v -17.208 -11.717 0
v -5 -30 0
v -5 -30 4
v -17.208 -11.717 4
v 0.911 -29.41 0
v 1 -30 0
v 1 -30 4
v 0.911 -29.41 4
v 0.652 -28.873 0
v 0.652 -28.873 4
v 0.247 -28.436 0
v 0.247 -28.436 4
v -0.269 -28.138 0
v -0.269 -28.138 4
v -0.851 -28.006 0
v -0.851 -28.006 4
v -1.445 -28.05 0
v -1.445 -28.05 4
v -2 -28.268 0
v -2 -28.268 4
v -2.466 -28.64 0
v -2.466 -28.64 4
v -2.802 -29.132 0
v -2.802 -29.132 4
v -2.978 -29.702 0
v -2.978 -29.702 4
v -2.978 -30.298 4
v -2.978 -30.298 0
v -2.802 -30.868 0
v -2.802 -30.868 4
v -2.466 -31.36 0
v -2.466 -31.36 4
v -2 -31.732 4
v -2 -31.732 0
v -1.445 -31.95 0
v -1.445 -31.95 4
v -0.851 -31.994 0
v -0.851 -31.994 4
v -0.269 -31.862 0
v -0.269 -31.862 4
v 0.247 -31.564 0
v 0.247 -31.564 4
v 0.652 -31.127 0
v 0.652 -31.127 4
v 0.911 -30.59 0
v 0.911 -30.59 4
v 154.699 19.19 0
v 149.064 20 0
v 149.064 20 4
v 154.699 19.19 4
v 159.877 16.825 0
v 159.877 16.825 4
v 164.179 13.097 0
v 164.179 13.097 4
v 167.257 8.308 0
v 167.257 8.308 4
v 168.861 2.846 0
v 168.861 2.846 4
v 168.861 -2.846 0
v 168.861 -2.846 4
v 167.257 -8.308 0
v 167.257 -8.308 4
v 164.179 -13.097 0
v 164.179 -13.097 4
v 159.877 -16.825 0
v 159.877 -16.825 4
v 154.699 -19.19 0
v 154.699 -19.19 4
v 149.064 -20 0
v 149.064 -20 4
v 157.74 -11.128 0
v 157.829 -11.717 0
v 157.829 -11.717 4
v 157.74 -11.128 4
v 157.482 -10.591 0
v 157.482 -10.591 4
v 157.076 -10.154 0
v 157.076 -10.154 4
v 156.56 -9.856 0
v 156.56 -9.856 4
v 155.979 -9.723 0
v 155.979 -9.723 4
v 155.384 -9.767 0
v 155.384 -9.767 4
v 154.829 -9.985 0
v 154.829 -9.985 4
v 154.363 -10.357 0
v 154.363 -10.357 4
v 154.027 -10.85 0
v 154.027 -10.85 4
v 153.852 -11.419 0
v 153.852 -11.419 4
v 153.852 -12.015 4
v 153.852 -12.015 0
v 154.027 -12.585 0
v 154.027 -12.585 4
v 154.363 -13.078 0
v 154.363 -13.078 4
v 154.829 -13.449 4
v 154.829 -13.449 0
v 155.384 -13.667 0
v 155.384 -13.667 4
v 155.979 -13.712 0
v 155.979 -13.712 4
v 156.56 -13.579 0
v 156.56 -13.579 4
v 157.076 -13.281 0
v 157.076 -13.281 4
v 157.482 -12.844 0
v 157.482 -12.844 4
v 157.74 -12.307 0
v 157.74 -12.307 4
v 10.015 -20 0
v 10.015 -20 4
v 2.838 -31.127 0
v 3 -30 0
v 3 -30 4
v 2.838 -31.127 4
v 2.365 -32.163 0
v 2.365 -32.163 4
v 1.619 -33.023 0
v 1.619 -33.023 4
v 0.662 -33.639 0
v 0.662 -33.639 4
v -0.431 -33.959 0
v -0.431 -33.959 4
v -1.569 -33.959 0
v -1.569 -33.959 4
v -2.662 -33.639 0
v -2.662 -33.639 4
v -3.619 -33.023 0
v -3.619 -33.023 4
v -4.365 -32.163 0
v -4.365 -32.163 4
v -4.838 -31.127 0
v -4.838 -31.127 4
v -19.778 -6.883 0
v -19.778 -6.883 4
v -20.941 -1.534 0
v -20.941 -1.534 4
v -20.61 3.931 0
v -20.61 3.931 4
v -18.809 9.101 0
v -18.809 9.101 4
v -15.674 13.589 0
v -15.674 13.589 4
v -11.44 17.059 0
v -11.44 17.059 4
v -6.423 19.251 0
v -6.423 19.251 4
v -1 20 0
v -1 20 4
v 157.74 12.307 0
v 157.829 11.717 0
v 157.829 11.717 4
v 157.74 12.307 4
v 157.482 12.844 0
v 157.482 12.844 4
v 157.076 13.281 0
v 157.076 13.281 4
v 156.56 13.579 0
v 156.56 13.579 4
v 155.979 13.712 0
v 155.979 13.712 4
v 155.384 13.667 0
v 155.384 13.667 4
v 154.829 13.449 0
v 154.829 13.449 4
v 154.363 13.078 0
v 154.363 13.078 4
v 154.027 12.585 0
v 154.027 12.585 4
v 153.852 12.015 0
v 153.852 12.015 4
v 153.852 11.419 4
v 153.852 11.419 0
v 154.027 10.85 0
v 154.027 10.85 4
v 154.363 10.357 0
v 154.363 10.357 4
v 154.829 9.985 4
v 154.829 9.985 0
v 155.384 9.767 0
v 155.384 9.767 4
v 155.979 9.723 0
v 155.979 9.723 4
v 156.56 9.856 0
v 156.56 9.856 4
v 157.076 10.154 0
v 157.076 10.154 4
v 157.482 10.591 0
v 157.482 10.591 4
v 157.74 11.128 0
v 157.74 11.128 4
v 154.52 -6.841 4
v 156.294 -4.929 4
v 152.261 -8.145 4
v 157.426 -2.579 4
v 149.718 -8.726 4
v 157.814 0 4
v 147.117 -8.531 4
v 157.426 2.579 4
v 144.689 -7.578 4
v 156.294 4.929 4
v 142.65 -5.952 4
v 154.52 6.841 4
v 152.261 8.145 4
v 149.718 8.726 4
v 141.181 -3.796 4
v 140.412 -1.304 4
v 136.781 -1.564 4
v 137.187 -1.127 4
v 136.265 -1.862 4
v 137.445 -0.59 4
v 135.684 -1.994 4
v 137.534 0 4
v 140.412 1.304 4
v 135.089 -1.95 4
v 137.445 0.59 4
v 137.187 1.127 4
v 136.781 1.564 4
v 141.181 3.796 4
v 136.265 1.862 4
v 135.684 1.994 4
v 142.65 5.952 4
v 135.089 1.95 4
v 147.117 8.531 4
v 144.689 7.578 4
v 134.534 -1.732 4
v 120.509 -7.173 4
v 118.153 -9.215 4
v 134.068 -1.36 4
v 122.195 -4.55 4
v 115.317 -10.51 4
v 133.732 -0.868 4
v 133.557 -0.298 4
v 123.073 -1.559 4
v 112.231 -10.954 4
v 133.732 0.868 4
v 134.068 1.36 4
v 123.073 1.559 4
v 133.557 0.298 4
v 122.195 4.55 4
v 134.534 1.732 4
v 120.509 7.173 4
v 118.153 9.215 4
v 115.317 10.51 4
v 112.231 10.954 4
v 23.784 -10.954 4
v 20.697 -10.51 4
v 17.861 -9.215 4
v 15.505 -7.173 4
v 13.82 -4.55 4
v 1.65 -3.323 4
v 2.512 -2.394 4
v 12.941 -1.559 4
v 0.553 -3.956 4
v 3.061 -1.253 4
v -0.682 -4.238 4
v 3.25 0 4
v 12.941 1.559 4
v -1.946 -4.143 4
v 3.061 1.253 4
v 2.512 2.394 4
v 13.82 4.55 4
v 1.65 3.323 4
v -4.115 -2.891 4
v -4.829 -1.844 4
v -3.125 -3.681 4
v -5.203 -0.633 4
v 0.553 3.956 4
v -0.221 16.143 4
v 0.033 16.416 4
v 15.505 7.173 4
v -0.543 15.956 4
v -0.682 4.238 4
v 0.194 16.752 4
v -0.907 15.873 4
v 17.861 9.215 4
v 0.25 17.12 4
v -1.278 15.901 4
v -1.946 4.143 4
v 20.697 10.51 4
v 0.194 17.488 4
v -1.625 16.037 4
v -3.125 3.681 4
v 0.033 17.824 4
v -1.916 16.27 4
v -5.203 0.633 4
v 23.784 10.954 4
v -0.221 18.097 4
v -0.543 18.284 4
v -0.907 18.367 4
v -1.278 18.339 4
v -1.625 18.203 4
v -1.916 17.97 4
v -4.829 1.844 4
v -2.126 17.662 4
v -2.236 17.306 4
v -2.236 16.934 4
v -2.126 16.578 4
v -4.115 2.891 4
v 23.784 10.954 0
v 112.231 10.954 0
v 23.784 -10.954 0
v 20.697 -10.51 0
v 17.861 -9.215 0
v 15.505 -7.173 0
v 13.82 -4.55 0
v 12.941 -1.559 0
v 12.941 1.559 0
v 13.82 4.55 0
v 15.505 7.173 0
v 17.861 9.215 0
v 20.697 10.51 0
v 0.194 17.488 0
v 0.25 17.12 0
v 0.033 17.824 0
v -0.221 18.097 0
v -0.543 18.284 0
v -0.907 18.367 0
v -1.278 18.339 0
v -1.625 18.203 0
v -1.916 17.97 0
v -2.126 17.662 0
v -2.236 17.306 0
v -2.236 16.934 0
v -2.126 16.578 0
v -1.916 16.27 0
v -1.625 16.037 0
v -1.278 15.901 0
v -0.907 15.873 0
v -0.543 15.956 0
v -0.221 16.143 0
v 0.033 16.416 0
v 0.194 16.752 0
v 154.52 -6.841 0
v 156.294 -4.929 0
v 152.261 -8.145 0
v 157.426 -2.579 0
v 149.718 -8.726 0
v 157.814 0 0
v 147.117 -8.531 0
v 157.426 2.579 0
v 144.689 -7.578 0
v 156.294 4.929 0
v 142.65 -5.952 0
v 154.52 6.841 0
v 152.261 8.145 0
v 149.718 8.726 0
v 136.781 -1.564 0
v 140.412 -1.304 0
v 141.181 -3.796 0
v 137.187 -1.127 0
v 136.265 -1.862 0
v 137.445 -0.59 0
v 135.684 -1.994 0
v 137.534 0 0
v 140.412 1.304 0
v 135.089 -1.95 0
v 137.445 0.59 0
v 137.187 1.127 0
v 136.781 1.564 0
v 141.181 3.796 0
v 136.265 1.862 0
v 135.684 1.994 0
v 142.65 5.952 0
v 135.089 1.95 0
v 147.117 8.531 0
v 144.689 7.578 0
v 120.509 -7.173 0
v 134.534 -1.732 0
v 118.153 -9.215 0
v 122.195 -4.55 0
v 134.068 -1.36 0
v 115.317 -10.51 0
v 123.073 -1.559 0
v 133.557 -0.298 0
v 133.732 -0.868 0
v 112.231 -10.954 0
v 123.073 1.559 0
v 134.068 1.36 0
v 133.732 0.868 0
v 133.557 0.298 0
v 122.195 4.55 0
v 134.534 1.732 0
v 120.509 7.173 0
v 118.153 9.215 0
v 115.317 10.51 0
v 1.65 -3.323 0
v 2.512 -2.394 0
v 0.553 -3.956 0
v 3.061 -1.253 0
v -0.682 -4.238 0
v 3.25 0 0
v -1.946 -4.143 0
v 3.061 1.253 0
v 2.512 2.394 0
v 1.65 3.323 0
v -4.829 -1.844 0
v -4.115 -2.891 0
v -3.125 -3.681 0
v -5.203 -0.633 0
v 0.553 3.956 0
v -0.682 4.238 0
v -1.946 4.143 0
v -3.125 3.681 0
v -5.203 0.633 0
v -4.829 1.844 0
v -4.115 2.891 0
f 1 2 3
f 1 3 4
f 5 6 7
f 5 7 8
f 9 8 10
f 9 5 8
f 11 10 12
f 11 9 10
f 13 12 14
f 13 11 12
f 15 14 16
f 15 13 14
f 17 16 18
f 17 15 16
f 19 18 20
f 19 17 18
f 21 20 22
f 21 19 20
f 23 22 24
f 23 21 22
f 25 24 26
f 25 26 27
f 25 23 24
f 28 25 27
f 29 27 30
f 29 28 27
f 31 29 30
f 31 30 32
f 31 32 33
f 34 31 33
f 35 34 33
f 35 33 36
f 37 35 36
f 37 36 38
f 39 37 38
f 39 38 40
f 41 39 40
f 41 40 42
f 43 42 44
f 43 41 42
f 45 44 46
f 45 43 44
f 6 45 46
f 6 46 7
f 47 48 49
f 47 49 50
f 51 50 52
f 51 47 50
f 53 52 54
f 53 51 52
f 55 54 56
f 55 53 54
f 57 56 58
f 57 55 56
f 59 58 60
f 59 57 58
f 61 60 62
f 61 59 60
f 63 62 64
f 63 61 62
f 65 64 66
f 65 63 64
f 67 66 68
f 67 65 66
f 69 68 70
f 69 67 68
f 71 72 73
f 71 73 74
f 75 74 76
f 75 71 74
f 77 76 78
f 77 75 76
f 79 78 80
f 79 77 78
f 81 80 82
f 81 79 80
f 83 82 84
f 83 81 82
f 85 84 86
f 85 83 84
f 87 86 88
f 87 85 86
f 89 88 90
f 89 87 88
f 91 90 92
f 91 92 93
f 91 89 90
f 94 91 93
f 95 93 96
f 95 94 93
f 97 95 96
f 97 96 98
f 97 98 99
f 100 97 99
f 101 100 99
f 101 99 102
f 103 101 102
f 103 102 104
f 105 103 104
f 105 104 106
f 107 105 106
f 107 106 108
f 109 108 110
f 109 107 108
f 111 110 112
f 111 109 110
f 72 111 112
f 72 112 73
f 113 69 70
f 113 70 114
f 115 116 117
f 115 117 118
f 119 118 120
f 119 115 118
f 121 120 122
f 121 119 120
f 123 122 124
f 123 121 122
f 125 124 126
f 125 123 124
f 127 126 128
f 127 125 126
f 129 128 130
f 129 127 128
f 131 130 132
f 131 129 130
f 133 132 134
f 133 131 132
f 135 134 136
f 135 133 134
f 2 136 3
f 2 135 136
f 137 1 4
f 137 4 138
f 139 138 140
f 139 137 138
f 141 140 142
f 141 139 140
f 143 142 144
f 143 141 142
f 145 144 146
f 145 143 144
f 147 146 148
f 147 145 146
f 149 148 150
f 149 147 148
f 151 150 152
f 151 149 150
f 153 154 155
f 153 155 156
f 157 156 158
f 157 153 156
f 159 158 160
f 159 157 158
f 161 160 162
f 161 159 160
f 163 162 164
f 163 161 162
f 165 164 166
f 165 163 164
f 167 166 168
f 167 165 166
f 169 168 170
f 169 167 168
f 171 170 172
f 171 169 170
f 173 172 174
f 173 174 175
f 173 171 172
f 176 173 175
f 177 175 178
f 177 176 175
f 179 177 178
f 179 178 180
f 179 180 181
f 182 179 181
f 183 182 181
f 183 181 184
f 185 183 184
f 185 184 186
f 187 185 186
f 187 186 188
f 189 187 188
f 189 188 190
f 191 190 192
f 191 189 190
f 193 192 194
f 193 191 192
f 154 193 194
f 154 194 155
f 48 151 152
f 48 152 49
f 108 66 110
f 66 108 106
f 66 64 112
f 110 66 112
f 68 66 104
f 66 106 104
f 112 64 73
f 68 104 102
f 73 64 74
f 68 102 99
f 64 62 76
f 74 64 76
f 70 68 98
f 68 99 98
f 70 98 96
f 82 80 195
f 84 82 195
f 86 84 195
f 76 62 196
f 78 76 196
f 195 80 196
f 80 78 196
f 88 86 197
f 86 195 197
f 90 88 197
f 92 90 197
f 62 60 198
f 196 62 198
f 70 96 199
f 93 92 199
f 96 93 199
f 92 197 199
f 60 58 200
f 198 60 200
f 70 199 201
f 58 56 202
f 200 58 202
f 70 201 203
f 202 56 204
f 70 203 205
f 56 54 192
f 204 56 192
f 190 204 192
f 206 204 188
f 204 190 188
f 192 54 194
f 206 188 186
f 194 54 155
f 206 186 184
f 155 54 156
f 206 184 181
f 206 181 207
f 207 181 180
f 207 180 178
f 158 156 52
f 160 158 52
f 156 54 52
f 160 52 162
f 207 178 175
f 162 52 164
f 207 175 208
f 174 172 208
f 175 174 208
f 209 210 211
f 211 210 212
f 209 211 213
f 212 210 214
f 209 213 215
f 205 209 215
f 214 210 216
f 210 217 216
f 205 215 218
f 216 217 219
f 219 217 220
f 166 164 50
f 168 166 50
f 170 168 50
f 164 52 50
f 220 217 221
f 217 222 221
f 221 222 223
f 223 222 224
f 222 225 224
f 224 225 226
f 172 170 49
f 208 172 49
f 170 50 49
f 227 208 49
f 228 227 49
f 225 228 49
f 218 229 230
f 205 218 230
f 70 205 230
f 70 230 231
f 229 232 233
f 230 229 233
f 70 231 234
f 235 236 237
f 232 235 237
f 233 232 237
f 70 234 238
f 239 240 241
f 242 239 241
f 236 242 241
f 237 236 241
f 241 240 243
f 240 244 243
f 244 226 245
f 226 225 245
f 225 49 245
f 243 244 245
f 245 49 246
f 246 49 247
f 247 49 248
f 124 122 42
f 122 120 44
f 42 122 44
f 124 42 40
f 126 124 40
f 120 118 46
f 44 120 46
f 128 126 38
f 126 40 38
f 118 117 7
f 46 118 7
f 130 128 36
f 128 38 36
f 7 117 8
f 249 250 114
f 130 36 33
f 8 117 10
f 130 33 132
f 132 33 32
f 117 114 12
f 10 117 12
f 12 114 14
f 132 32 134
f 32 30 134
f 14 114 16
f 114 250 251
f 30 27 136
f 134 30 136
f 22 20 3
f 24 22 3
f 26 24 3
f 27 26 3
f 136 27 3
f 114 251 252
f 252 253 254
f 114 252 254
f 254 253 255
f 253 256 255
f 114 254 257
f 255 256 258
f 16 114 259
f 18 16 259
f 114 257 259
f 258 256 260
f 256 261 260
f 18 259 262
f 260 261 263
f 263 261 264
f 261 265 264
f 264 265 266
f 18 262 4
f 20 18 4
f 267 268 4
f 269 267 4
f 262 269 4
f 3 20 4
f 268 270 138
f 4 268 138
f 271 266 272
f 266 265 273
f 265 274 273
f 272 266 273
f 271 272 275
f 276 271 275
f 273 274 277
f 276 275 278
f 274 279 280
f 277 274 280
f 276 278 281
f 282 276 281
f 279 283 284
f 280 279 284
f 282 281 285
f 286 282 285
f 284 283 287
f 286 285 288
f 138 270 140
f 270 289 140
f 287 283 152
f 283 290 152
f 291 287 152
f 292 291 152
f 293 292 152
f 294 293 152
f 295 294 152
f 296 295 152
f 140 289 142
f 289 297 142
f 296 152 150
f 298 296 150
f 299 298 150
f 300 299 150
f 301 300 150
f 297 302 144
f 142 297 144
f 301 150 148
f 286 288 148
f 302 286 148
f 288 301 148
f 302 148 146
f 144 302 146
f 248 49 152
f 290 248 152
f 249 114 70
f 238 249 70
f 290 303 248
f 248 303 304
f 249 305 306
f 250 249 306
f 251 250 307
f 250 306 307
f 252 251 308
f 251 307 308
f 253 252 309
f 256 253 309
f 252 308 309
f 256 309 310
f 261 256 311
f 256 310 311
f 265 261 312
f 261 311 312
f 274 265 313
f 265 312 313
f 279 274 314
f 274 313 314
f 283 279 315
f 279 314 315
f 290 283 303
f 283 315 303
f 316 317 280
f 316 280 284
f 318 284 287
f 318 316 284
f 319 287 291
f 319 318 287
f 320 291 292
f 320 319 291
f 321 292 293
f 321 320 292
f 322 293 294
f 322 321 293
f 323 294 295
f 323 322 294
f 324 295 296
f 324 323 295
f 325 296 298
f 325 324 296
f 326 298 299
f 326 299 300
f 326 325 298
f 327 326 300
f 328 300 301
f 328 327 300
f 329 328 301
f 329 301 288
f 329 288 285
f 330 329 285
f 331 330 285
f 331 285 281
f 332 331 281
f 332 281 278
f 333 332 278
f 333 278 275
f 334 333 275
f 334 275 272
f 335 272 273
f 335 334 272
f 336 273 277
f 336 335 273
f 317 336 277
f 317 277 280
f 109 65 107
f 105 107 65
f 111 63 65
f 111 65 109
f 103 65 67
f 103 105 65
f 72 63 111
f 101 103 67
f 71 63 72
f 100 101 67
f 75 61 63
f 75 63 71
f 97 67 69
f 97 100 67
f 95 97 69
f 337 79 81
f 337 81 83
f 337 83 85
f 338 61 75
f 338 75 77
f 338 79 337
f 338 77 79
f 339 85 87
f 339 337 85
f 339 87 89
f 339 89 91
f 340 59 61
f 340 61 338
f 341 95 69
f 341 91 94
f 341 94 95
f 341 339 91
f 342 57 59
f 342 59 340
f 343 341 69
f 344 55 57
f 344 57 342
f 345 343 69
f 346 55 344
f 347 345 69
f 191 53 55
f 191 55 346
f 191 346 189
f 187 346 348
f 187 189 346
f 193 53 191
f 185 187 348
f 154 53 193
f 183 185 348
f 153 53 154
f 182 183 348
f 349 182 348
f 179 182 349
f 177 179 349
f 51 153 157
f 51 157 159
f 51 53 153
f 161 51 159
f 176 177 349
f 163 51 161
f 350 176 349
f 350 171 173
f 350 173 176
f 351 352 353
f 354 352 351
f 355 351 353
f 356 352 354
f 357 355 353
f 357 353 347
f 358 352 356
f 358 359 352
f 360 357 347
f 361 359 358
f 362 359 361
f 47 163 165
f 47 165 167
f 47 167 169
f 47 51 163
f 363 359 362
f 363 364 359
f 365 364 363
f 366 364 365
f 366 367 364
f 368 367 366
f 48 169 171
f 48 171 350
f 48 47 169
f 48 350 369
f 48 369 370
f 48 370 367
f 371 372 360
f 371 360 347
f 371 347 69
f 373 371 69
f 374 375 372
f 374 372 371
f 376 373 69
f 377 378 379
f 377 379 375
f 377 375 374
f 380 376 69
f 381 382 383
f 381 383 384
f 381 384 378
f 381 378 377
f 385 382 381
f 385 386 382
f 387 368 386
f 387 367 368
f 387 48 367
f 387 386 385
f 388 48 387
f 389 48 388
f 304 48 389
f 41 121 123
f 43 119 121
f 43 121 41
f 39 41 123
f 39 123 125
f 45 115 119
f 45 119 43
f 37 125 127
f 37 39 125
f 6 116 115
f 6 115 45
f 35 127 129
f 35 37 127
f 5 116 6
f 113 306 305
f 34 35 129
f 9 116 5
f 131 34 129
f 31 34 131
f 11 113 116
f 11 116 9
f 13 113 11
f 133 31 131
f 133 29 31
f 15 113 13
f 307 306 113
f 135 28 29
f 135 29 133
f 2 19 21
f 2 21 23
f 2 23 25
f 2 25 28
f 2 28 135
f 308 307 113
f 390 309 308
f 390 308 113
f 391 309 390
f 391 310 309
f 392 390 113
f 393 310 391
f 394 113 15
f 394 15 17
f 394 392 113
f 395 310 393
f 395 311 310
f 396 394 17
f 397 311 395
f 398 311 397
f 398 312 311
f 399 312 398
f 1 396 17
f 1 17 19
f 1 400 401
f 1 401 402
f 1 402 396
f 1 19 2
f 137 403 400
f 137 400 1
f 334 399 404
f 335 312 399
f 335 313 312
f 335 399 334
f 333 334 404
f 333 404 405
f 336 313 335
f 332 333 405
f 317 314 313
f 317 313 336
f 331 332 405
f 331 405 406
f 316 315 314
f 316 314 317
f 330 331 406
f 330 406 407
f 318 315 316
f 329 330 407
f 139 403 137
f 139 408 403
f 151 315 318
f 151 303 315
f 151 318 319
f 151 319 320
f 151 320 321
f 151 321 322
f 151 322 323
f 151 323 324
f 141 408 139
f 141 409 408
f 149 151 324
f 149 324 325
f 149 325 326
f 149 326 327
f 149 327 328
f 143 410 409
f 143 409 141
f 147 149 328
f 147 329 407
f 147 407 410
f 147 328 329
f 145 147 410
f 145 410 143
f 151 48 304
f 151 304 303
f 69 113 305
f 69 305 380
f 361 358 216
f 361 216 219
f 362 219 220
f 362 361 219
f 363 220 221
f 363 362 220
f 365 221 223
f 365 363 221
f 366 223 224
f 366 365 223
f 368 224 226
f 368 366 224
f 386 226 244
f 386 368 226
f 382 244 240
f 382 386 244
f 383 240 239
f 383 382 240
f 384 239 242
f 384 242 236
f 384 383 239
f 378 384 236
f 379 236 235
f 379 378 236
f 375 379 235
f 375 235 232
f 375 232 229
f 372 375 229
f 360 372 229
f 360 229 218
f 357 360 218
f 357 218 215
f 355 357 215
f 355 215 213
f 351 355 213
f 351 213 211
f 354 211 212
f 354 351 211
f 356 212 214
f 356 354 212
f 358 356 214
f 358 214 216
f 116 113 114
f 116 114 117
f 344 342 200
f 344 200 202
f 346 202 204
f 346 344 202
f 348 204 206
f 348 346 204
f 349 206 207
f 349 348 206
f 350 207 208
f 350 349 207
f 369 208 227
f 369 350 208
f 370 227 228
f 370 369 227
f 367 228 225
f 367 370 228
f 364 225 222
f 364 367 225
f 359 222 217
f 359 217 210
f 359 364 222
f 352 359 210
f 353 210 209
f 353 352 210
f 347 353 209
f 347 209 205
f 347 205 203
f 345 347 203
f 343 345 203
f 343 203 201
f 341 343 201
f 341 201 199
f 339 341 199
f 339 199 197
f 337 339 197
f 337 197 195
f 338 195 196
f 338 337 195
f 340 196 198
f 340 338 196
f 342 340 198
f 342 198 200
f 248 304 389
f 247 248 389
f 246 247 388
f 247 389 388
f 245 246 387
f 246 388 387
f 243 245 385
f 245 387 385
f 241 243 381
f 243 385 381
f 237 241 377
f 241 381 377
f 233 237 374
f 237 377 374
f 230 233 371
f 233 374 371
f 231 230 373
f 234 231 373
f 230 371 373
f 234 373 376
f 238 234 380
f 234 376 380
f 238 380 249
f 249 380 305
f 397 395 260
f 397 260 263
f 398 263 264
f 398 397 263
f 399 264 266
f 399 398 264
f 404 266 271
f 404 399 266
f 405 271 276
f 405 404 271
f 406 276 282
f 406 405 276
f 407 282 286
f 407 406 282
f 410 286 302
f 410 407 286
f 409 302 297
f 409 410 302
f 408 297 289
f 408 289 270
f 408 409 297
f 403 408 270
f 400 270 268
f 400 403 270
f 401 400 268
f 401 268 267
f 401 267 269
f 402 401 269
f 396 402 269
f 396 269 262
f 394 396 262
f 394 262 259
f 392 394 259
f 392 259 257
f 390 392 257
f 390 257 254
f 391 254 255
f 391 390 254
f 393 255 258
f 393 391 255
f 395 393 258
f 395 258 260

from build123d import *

# Parameters (mm, degrees)
SKETCH_1_R      = 4.25
SKETCH_1_R_2    = 8.75
SKETCH_1_R_3    = 2
SKETCH_1_R_4    = 1.25
EXTRUDE_1_DEPTH = 4


with BuildPart() as part:
    # 草图1 → 凸台-拉伸1 (new body)
    with BuildSketch(Plane.XY):
        with BuildLine():
            Line((-5, -30), (-17.208156126, -11.717323713))
            ThreePointArc((-17.208156126, -11.717323713), (-18.809358134, 9.10092099), (-1, 20))
            Line((-1, 20), (149.064295006, 20))
            ThreePointArc((149.064295006, 20), (169.064295006, 0), (149.064295006, -20))
            Line((149.064295006, -20), (10.014533743, -20))
            Line((10.014533743, -20), (3, -30))
            ThreePointArc((3, -30), (-1, -34), (-5, -30))
        make_face()
        with Locations((-1, 0)):
            Circle(SKETCH_1_R, mode=Mode.SUBTRACT)
        with Locations((149.064295006, 0)):
            Circle(SKETCH_1_R_2, mode=Mode.SUBTRACT)
        with Locations((135.534295006, 0)):
            Circle(SKETCH_1_R_3, mode=Mode.SUBTRACT)
        with Locations((155.829295006, 11.717323713)):
            Circle(SKETCH_1_R_3, mode=Mode.SUBTRACT)
        with Locations((155.829295006, -11.717323713)):
            Circle(SKETCH_1_R_3, mode=Mode.SUBTRACT)
        with Locations((-1, -30)):
            Circle(SKETCH_1_R_3, mode=Mode.SUBTRACT)
        with Locations((-1, 17.12)):
            Circle(SKETCH_1_R_4, mode=Mode.SUBTRACT)
        with BuildLine():
            Line((23.78352134, 10.95385289), (112.230567298, 10.95385289))
            ThreePointArc((112.230567298, 10.95385289), (123.184420188, 0), (112.230567298, -10.95385289))
            Line((112.230567298, -10.95385289), (23.78352134, -10.95385289))
            ThreePointArc((23.78352134, -10.95385289), (12.829668451, 0), (23.78352134, 10.95385289))
        make_face(mode=Mode.SUBTRACT)
    extrude(amount=EXTRUDE_1_DEPTH)


solid = part.part
